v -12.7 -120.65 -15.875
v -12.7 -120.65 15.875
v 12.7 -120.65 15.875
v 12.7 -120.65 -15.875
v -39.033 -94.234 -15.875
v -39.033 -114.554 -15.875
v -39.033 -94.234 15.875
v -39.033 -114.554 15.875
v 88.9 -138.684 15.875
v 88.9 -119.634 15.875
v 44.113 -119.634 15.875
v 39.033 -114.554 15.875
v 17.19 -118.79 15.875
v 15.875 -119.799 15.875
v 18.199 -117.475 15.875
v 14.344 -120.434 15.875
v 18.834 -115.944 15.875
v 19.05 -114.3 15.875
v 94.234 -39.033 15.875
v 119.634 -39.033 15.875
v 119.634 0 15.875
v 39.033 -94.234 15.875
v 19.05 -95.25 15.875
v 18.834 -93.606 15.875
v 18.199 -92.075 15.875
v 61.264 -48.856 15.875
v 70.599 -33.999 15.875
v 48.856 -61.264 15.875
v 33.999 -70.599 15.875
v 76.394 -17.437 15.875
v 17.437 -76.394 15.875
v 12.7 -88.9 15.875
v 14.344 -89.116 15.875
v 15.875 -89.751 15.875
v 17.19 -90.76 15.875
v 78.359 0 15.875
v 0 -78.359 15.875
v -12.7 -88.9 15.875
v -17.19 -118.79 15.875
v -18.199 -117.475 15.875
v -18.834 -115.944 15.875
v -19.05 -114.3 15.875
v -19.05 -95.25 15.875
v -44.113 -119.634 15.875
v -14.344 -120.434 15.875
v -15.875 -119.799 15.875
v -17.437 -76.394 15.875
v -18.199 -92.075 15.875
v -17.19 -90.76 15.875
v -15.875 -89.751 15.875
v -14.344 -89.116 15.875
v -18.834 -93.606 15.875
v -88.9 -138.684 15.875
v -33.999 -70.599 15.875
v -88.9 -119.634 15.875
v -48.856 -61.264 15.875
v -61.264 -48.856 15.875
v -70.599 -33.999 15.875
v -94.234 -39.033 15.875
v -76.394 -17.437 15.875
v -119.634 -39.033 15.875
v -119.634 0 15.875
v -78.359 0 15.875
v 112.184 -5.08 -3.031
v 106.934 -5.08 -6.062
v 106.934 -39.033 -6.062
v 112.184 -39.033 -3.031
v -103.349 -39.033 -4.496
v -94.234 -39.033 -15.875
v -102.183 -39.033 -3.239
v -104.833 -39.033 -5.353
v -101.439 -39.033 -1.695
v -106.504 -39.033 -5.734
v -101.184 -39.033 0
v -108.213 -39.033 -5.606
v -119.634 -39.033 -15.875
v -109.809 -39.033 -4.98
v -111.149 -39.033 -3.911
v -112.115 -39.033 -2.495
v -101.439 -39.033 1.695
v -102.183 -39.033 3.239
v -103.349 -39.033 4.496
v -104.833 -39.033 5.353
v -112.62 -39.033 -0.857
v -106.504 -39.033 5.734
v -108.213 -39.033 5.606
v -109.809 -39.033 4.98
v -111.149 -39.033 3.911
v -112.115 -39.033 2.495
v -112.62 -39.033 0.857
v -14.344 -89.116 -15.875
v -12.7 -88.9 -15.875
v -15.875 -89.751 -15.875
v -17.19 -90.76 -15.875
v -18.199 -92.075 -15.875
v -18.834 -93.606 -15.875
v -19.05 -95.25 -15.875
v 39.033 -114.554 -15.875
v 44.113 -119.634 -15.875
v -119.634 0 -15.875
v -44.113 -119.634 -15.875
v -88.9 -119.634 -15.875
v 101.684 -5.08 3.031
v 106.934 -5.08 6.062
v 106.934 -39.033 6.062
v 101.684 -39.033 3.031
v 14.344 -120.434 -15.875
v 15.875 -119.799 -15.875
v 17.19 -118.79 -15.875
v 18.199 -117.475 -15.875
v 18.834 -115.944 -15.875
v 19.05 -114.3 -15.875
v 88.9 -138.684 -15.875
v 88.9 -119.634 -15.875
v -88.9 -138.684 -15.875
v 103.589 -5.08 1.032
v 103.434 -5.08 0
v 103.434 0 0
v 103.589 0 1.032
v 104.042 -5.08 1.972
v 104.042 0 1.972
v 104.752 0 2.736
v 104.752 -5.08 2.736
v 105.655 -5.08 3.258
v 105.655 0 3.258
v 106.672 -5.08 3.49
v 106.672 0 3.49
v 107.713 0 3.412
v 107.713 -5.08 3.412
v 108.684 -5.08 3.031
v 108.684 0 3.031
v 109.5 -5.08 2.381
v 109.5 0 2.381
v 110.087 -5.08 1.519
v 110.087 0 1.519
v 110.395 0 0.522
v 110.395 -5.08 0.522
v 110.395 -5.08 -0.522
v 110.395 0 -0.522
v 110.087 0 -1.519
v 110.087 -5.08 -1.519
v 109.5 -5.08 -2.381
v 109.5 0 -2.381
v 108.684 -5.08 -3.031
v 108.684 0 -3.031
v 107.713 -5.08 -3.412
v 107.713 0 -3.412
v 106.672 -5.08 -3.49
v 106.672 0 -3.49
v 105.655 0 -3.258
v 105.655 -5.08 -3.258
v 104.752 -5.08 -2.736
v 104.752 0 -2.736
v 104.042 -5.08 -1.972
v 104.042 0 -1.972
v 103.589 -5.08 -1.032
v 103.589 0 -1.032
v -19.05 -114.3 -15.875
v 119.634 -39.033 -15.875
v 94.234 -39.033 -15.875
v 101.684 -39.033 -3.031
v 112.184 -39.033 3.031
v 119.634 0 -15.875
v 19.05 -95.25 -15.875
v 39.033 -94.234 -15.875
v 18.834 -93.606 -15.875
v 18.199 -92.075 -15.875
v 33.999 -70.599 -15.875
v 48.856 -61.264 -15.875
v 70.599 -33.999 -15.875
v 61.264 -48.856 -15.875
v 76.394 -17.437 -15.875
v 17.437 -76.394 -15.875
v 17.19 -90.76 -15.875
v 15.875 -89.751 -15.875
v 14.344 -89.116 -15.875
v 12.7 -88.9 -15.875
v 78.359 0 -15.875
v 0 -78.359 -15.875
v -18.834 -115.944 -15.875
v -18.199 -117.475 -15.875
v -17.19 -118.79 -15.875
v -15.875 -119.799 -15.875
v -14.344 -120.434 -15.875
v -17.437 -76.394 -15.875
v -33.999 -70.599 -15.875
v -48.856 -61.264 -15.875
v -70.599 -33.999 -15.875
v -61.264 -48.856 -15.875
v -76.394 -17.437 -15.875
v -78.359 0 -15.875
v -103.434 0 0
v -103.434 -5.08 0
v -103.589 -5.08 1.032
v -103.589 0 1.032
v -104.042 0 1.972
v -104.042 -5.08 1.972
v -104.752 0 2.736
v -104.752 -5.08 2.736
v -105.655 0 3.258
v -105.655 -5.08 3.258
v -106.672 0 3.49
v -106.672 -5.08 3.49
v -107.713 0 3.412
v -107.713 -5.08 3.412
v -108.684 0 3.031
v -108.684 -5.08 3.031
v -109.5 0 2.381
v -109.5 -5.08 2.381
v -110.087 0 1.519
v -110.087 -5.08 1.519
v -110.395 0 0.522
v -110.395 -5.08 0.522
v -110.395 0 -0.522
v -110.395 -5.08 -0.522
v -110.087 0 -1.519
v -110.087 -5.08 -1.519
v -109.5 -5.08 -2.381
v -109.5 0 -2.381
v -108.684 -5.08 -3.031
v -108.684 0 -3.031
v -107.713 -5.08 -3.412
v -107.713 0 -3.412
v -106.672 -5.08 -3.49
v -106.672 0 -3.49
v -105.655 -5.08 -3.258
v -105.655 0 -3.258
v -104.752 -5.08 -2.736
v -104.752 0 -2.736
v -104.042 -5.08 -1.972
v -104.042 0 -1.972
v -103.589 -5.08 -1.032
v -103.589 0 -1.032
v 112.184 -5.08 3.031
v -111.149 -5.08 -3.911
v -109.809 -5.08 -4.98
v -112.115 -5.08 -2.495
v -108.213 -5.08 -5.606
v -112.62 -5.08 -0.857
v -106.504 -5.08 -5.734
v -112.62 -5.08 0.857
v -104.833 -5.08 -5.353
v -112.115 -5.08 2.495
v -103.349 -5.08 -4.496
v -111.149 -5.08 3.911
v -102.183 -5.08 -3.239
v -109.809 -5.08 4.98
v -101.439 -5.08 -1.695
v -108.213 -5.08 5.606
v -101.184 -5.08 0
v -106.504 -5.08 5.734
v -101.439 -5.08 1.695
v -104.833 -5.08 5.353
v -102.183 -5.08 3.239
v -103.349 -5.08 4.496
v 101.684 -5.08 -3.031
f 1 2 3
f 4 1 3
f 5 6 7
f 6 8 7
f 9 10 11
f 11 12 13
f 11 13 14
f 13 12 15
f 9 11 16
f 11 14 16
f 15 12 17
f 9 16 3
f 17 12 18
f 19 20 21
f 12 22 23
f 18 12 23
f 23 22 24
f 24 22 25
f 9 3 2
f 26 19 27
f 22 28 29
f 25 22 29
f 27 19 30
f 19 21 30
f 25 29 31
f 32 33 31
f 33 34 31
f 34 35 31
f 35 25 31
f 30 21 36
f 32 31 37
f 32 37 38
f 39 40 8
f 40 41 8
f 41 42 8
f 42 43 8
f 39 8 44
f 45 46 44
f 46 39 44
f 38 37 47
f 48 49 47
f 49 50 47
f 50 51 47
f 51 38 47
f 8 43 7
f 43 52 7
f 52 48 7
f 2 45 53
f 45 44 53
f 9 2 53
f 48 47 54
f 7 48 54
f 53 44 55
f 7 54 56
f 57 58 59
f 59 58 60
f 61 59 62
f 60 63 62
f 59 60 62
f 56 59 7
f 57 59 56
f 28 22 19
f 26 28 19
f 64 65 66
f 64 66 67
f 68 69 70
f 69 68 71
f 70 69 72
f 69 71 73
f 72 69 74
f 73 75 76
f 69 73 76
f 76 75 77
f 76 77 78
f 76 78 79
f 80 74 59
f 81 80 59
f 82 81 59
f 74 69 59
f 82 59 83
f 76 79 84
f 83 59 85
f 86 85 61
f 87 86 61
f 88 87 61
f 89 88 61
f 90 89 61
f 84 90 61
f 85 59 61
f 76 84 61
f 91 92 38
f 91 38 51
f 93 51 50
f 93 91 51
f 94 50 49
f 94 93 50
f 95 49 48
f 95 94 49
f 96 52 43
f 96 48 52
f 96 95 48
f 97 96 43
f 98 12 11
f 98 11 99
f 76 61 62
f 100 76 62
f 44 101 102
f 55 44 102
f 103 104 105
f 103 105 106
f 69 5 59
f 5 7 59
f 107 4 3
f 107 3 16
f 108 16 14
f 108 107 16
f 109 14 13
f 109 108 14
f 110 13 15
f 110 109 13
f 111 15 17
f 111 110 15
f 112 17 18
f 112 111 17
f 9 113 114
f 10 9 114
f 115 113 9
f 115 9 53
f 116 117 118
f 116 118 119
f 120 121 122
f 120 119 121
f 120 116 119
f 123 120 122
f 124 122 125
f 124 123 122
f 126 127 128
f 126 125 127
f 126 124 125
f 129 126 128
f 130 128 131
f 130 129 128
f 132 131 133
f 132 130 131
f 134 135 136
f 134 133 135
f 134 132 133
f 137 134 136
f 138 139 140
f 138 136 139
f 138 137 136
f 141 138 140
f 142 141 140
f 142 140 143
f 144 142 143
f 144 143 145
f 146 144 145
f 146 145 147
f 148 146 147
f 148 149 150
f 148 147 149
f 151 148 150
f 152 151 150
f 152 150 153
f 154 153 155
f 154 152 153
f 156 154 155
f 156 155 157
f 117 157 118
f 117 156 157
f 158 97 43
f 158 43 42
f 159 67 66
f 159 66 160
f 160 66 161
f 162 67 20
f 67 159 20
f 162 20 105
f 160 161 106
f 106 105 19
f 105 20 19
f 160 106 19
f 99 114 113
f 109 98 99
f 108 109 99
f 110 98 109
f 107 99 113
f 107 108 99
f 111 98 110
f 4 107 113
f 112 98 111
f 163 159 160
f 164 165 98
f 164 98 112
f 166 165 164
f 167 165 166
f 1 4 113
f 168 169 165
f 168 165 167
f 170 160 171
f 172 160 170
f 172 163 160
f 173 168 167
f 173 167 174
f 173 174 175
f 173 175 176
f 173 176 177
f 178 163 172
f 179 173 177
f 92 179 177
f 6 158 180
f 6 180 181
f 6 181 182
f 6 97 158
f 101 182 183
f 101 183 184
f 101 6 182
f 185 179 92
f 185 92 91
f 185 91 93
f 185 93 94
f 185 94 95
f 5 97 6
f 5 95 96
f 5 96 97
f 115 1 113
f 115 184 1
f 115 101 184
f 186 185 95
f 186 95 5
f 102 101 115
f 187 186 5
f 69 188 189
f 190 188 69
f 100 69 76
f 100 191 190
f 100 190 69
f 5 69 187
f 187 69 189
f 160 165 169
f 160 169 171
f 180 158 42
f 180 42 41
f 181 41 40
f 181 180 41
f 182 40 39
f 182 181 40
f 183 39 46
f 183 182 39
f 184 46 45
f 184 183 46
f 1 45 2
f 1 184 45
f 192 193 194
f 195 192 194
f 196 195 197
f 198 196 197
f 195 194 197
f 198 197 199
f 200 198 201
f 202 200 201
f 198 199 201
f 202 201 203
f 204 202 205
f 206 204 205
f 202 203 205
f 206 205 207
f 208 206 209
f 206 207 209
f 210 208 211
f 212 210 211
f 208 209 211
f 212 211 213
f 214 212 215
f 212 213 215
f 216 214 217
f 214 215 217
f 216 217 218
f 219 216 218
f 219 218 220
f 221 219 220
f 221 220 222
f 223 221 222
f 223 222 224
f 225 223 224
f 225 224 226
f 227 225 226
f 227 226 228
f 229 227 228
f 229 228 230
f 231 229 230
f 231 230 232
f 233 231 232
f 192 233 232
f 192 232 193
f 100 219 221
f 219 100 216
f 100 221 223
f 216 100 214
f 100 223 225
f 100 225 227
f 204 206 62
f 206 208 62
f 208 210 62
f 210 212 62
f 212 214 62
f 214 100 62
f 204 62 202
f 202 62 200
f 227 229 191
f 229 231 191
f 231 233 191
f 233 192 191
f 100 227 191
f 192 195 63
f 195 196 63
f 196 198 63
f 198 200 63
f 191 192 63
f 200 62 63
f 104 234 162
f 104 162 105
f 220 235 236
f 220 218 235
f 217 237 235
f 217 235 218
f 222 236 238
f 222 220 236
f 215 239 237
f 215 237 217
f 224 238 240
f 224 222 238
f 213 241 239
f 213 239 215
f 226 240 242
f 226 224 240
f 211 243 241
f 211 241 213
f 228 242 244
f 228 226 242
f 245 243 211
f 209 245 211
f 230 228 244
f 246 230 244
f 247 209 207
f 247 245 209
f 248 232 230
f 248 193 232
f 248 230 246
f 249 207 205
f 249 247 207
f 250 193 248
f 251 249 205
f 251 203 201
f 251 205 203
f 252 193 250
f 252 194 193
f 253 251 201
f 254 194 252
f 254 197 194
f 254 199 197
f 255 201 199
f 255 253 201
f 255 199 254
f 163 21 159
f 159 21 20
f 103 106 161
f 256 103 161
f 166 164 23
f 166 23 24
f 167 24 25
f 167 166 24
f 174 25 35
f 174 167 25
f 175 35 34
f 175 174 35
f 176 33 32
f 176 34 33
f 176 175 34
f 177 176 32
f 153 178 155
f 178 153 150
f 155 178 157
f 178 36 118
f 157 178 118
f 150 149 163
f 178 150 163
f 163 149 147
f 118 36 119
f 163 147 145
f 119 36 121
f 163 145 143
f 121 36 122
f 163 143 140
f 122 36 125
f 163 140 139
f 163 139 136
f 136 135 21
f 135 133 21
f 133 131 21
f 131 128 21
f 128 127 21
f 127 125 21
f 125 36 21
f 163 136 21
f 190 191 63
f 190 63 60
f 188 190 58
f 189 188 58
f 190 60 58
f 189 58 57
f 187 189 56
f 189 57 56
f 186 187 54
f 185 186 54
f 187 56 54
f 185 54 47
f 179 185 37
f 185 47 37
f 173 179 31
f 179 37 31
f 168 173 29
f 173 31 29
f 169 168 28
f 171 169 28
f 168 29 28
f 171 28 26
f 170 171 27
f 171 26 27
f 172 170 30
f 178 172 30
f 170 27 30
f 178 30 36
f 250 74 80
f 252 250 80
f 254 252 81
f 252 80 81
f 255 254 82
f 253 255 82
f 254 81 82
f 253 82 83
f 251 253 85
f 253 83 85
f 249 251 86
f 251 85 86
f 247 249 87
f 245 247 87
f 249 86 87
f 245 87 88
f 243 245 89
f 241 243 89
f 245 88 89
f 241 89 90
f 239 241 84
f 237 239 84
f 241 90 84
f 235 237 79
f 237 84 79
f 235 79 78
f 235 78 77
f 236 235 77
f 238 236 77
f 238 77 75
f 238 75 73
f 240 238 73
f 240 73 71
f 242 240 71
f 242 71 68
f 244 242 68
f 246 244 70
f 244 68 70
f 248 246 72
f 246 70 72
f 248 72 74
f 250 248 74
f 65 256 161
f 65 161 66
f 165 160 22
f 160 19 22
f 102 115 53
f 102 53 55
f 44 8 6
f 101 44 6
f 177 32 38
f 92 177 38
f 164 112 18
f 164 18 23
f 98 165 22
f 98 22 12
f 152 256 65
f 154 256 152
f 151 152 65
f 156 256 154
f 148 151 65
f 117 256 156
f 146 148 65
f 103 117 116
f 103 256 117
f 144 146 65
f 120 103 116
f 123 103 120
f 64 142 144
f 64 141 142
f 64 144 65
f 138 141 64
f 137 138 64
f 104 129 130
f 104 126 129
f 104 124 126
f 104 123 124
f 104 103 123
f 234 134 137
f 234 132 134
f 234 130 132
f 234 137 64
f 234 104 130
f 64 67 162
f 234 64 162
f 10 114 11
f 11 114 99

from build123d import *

# Parameters (mm, degrees)
BASE_GEO_DEPTH                  = 15.875
SKETCH2_R                       = 3.5000057
BOLT_HOLE_DEPTH                 = 40.033000837
SKETCH3_R                       = 5.7500012
NUT_AND_BOLT_HEAD_CUTOUTS_DEPTH = 33.953001
SKETCH5_W                       = 177.8
SKETCH5_H                       = 19.05
BOSS_EXTRUDE1_DEPTH             = 31.75
CUT_EXTRUDE1_DEPTH              = 32.75
CHAMFER1_SIZE                   = 5.08


with BuildPart() as part:
    # Sketch1 → base geo (new body, symmetric)
    with BuildSketch(Plane.XY):
        with BuildLine():
            ThreePointArc((-78.359, 0), (0, -78.359), (78.359, 0))
            Line((78.359, 0), (119.634, 0))
            Line((119.634, 0), (119.634, -39.033000837))
            Line((119.634, -39.033000837), (94.234, -39.033000837))
            Line((94.234, -39.033000837), (39.033000837, -94.234))
            Line((39.033000837, -94.234), (39.033000837, -119.634))
            Line((39.033000837, -119.634), (-39.033000837, -119.634))
            Line((-39.033000837, -119.634), (-39.033000837, -94.234))
            Line((-39.033000837, -94.234), (-94.234, -39.033000837))
            Line((-94.234, -39.033000837), (-119.634, -39.033000837))
            Line((-119.634, -39.033000837), (-119.634, 0))
            Line((-119.634, 0), (-78.359, 0))
        make_face()
    extrude(amount=BASE_GEO_DEPTH, both=True)

    # Sketch2 → bolt hole (cut, through all)
    with BuildSketch(Plane.XZ.offset(39.033000837)):
        with Locations((-106.934, 0)):
            Circle(SKETCH2_R)
    bolt_hole = extrude(amount=-BOLT_HOLE_DEPTH, mode=Mode.SUBTRACT)

    # bolt hole mirrored: bolt hole across plane
    add(bolt_hole.mirror(Plane(origin=(0, 0, 0), x_dir=(0, 0, 1), z_dir=(1, 0, 0))), mode=Mode.SUBTRACT)

    # Sketch3 → nut and bolt head cutouts (cut)
    with BuildSketch(Plane.XZ.offset(39.033000837)):
        with Locations((-106.934, 0)):
            Circle(SKETCH3_R)
        Polygon((112.1840022, -3.031090183), (112.1840022, 3.031090183), (106.934, 6.062180367), (101.6839978, 3.031090183), (101.6839978, -3.031090183), (106.934, -6.062180367), align=None)
    extrude(amount=-NUT_AND_BOLT_HEAD_CUTOUTS_DEPTH, mode=Mode.SUBTRACT)

    # Sketch5 → Boss-Extrude1 (add)
    with BuildSketch(Plane(origin=(0, 0, -15.875), x_dir=(-1, 0, 0), z_dir=(0, 0, -1))):
        with Locations((0, -129.159)):
            Rectangle(SKETCH5_W, SKETCH5_H)
    extrude(amount=-BOSS_EXTRUDE1_DEPTH)

    # Sketch6 → Cut-Extrude1 (cut, through all)
    with BuildSketch(Plane(origin=(0, 0, -15.875), x_dir=(-1, 0, 0), z_dir=(0, 0, -1))):
        with BuildLine():
            Line((12.7, -120.65), (-12.7, -120.65))
            ThreePointArc((-12.7, -120.65), (-17.190128061, -118.790128061), (-19.05, -114.3))
            Line((-19.05, -114.3), (-19.05, -95.25))
            ThreePointArc((-19.05, -95.25), (-17.190128061, -90.759871939), (-12.7, -88.9))
            Line((-12.7, -88.9), (12.7, -88.9))
            ThreePointArc((12.7, -88.9), (17.190128061, -90.759871939), (19.05, -95.25))
            Line((19.05, -95.25), (19.05, -114.3))
            ThreePointArc((19.05, -114.3), (17.190128061, -118.790128061), (12.7, -120.65))
        make_face()
    extrude(amount=-CUT_EXTRUDE1_DEPTH, mode=Mode.SUBTRACT)

    # Chamfer1
    chamfer1_edges = [part.edges().sort_by_distance(p)[0] for p in [
        (39.033000837, -119.634, 0),
        (-39.033000837, -119.634, 0),
    ]]
    chamfer(chamfer1_edges, length=CHAMFER1_SIZE)


solid = part.part
